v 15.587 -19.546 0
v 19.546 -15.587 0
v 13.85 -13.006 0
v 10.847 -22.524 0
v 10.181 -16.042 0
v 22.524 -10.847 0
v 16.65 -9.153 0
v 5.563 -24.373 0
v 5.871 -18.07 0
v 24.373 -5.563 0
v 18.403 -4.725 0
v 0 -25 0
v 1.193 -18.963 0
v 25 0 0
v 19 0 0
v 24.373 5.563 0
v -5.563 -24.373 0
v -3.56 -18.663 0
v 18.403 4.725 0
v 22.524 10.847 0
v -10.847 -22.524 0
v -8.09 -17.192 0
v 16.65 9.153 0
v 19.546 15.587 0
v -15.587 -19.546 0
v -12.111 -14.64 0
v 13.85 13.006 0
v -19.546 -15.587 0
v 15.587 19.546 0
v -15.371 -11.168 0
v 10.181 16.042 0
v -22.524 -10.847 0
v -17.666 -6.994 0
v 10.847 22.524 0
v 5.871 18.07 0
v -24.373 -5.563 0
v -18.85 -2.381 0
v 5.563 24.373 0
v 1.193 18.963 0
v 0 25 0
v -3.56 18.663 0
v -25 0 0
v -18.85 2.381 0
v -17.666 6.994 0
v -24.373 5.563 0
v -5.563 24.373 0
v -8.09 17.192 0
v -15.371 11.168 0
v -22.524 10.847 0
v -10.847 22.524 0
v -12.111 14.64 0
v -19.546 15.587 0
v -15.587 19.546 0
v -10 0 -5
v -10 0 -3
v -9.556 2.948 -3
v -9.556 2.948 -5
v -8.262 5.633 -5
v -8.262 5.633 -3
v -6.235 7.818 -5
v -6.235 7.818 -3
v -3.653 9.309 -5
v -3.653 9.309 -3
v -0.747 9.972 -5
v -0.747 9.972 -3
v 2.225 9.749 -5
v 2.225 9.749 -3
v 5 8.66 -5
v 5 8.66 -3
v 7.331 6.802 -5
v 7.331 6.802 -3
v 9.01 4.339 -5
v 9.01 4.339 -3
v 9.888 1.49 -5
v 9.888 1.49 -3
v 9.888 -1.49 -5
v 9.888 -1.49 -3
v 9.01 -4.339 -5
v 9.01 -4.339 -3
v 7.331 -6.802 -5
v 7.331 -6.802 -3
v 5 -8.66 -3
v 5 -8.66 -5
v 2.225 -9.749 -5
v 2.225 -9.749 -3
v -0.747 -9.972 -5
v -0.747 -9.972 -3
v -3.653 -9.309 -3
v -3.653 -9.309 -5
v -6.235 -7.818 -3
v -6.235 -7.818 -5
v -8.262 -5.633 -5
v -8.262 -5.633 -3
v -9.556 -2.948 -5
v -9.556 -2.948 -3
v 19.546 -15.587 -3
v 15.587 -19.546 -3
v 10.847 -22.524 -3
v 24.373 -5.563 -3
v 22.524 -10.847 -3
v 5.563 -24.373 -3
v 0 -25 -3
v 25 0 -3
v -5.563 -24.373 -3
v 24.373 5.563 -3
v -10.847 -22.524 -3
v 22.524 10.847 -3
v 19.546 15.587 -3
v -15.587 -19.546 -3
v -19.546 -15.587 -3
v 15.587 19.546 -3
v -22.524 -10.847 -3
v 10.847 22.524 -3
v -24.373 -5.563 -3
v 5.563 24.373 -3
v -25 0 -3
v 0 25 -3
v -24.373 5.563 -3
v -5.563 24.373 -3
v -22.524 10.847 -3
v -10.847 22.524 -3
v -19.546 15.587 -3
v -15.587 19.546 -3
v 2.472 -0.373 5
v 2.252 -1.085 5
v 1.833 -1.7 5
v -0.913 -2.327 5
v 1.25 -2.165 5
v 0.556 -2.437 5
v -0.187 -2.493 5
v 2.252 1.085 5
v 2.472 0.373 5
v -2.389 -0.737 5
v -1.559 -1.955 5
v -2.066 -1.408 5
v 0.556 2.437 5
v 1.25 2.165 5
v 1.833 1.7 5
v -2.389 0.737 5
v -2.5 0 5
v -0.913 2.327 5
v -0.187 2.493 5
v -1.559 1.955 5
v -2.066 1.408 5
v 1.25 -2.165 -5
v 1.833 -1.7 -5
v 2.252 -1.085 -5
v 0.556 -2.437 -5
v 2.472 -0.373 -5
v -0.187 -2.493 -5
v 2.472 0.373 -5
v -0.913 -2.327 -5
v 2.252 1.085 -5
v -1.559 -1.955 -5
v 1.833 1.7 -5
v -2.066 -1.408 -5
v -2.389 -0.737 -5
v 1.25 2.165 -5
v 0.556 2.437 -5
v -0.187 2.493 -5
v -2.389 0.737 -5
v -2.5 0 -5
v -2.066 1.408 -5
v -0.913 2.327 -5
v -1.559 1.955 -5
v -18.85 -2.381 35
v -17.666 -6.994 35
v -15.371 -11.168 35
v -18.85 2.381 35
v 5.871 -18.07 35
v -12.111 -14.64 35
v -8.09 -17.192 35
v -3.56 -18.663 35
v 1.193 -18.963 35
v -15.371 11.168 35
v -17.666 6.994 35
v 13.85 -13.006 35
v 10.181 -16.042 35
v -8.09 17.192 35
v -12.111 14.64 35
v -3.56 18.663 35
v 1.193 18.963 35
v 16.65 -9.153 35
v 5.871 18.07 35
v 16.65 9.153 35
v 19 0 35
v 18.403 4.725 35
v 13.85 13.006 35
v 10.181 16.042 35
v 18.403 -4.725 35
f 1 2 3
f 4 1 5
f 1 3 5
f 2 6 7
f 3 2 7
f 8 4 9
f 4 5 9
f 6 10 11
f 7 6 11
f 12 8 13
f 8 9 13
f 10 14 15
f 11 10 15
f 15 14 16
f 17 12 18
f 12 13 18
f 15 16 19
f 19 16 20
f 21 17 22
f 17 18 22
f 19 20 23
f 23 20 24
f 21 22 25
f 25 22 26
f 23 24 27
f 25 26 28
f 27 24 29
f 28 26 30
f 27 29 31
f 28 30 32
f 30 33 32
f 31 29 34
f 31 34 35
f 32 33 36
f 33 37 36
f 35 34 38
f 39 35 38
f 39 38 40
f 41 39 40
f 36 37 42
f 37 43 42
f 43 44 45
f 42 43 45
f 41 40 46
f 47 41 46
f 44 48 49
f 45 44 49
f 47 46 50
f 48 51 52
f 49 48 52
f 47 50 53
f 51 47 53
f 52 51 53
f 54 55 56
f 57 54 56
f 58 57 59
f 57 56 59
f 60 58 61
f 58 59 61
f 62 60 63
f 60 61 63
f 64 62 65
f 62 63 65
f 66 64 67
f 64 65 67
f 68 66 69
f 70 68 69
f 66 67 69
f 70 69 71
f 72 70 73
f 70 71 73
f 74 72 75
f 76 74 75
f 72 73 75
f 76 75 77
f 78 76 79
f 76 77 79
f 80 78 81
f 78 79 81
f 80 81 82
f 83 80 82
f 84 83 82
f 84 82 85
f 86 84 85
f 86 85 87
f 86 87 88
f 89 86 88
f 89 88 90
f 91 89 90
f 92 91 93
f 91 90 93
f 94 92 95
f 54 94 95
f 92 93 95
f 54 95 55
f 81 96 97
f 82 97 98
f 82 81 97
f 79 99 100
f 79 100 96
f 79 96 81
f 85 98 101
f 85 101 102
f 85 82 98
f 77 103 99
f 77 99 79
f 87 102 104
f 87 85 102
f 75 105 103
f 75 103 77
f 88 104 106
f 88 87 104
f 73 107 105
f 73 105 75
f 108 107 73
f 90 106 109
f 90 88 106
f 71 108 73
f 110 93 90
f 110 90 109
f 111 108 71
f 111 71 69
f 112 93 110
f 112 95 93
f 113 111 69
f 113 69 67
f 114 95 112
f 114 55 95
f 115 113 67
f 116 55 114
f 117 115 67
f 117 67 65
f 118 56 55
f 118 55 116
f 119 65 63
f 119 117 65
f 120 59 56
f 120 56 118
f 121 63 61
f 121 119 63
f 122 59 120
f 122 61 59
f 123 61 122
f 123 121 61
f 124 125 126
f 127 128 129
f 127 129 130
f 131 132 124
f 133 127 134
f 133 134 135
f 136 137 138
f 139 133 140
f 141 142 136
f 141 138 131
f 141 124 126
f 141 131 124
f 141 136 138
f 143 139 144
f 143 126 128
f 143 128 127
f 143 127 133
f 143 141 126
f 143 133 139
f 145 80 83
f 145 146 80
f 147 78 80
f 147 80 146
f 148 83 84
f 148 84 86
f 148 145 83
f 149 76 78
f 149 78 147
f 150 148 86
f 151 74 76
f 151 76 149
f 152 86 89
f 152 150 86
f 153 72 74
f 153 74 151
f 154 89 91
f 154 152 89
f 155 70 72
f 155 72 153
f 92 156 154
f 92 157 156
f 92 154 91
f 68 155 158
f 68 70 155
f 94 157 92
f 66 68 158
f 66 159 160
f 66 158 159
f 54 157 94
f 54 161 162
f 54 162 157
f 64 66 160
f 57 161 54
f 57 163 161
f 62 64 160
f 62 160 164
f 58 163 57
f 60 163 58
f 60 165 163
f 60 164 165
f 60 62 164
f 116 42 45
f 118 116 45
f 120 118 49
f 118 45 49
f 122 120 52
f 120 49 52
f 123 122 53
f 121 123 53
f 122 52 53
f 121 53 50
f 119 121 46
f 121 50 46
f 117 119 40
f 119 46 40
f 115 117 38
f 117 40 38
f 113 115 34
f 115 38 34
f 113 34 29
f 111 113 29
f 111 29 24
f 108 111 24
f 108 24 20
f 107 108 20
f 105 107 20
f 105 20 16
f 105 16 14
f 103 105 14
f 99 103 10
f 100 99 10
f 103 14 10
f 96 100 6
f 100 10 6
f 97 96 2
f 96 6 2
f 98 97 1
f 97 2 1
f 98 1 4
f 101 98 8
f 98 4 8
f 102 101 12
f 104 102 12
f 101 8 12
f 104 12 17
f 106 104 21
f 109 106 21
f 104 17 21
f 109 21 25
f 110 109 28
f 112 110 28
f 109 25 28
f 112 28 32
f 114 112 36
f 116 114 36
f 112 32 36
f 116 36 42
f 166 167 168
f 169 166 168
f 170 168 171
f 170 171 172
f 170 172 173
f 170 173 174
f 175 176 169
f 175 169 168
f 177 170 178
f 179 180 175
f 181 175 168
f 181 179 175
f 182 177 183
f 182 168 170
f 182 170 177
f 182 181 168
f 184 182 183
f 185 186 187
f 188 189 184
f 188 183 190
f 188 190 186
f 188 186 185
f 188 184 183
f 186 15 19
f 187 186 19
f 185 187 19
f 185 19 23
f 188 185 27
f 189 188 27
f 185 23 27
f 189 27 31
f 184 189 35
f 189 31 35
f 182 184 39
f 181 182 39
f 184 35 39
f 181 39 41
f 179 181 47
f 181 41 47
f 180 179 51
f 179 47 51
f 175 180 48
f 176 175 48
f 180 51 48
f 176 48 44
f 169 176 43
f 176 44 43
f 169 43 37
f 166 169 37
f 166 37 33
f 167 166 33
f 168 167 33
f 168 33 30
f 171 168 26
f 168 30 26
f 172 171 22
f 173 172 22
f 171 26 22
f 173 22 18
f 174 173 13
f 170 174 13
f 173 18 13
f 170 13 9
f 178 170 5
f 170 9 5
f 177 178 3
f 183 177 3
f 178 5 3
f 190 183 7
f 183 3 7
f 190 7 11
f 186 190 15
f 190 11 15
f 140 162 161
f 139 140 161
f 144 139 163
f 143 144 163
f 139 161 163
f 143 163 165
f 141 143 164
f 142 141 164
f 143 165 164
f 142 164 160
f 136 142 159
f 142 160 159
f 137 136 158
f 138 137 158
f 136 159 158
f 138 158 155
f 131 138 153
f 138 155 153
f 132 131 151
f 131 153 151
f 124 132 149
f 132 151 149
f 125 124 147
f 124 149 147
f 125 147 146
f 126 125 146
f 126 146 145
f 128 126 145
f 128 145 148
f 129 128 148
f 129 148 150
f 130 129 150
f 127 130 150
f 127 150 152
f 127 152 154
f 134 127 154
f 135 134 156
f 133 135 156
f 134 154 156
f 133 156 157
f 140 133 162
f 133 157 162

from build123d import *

# Parameters (mm, degrees)
ESQUISSE1_R             = 19
BASE_EXTRUSION_DEPTH    = 35
ESQUISSE2_R             = 25
BOSS_EXTRU_1_DEPTH      = 3
ESQUISSE3_R             = 10
BOSS_EXTRU_2_DEPTH      = 2
ESQUISSE4_R             = 2.5
ENL_V_MAT_EXTRU_1_DEPTH = 10


with BuildPart() as part:
    # Esquisse1 → Base-Extrusion (new body)
    with BuildSketch(Plane.XY):
        Circle(ESQUISSE1_R)
    extrude(amount=BASE_EXTRUSION_DEPTH)

    # Esquisse2 → Boss.-Extru.1 (add)
    with BuildSketch(Plane(origin=(0, 0, 0), x_dir=(-1, 0, 0), z_dir=(0, 0, -1))):
        Circle(ESQUISSE2_R)
    extrude(amount=BOSS_EXTRU_1_DEPTH)

    # Esquisse3 → Boss.-Extru.2 (add)
    with BuildSketch(Plane(origin=(0, 0, -3), x_dir=(-1, 0, 0), z_dir=(0, 0, -1))):
        Circle(ESQUISSE3_R)
    extrude(amount=BOSS_EXTRU_2_DEPTH)

    # Esquisse4 → Enlèv. mat.-Extru.1 (cut)
    with BuildSketch(Plane(origin=(0, 0, -5), x_dir=(-1, 0, 0), z_dir=(0, 0, -1))):
        Circle(ESQUISSE4_R)
    extrude(amount=-ENL_V_MAT_EXTRU_1_DEPTH, mode=Mode.SUBTRACT)


solid = part.part
